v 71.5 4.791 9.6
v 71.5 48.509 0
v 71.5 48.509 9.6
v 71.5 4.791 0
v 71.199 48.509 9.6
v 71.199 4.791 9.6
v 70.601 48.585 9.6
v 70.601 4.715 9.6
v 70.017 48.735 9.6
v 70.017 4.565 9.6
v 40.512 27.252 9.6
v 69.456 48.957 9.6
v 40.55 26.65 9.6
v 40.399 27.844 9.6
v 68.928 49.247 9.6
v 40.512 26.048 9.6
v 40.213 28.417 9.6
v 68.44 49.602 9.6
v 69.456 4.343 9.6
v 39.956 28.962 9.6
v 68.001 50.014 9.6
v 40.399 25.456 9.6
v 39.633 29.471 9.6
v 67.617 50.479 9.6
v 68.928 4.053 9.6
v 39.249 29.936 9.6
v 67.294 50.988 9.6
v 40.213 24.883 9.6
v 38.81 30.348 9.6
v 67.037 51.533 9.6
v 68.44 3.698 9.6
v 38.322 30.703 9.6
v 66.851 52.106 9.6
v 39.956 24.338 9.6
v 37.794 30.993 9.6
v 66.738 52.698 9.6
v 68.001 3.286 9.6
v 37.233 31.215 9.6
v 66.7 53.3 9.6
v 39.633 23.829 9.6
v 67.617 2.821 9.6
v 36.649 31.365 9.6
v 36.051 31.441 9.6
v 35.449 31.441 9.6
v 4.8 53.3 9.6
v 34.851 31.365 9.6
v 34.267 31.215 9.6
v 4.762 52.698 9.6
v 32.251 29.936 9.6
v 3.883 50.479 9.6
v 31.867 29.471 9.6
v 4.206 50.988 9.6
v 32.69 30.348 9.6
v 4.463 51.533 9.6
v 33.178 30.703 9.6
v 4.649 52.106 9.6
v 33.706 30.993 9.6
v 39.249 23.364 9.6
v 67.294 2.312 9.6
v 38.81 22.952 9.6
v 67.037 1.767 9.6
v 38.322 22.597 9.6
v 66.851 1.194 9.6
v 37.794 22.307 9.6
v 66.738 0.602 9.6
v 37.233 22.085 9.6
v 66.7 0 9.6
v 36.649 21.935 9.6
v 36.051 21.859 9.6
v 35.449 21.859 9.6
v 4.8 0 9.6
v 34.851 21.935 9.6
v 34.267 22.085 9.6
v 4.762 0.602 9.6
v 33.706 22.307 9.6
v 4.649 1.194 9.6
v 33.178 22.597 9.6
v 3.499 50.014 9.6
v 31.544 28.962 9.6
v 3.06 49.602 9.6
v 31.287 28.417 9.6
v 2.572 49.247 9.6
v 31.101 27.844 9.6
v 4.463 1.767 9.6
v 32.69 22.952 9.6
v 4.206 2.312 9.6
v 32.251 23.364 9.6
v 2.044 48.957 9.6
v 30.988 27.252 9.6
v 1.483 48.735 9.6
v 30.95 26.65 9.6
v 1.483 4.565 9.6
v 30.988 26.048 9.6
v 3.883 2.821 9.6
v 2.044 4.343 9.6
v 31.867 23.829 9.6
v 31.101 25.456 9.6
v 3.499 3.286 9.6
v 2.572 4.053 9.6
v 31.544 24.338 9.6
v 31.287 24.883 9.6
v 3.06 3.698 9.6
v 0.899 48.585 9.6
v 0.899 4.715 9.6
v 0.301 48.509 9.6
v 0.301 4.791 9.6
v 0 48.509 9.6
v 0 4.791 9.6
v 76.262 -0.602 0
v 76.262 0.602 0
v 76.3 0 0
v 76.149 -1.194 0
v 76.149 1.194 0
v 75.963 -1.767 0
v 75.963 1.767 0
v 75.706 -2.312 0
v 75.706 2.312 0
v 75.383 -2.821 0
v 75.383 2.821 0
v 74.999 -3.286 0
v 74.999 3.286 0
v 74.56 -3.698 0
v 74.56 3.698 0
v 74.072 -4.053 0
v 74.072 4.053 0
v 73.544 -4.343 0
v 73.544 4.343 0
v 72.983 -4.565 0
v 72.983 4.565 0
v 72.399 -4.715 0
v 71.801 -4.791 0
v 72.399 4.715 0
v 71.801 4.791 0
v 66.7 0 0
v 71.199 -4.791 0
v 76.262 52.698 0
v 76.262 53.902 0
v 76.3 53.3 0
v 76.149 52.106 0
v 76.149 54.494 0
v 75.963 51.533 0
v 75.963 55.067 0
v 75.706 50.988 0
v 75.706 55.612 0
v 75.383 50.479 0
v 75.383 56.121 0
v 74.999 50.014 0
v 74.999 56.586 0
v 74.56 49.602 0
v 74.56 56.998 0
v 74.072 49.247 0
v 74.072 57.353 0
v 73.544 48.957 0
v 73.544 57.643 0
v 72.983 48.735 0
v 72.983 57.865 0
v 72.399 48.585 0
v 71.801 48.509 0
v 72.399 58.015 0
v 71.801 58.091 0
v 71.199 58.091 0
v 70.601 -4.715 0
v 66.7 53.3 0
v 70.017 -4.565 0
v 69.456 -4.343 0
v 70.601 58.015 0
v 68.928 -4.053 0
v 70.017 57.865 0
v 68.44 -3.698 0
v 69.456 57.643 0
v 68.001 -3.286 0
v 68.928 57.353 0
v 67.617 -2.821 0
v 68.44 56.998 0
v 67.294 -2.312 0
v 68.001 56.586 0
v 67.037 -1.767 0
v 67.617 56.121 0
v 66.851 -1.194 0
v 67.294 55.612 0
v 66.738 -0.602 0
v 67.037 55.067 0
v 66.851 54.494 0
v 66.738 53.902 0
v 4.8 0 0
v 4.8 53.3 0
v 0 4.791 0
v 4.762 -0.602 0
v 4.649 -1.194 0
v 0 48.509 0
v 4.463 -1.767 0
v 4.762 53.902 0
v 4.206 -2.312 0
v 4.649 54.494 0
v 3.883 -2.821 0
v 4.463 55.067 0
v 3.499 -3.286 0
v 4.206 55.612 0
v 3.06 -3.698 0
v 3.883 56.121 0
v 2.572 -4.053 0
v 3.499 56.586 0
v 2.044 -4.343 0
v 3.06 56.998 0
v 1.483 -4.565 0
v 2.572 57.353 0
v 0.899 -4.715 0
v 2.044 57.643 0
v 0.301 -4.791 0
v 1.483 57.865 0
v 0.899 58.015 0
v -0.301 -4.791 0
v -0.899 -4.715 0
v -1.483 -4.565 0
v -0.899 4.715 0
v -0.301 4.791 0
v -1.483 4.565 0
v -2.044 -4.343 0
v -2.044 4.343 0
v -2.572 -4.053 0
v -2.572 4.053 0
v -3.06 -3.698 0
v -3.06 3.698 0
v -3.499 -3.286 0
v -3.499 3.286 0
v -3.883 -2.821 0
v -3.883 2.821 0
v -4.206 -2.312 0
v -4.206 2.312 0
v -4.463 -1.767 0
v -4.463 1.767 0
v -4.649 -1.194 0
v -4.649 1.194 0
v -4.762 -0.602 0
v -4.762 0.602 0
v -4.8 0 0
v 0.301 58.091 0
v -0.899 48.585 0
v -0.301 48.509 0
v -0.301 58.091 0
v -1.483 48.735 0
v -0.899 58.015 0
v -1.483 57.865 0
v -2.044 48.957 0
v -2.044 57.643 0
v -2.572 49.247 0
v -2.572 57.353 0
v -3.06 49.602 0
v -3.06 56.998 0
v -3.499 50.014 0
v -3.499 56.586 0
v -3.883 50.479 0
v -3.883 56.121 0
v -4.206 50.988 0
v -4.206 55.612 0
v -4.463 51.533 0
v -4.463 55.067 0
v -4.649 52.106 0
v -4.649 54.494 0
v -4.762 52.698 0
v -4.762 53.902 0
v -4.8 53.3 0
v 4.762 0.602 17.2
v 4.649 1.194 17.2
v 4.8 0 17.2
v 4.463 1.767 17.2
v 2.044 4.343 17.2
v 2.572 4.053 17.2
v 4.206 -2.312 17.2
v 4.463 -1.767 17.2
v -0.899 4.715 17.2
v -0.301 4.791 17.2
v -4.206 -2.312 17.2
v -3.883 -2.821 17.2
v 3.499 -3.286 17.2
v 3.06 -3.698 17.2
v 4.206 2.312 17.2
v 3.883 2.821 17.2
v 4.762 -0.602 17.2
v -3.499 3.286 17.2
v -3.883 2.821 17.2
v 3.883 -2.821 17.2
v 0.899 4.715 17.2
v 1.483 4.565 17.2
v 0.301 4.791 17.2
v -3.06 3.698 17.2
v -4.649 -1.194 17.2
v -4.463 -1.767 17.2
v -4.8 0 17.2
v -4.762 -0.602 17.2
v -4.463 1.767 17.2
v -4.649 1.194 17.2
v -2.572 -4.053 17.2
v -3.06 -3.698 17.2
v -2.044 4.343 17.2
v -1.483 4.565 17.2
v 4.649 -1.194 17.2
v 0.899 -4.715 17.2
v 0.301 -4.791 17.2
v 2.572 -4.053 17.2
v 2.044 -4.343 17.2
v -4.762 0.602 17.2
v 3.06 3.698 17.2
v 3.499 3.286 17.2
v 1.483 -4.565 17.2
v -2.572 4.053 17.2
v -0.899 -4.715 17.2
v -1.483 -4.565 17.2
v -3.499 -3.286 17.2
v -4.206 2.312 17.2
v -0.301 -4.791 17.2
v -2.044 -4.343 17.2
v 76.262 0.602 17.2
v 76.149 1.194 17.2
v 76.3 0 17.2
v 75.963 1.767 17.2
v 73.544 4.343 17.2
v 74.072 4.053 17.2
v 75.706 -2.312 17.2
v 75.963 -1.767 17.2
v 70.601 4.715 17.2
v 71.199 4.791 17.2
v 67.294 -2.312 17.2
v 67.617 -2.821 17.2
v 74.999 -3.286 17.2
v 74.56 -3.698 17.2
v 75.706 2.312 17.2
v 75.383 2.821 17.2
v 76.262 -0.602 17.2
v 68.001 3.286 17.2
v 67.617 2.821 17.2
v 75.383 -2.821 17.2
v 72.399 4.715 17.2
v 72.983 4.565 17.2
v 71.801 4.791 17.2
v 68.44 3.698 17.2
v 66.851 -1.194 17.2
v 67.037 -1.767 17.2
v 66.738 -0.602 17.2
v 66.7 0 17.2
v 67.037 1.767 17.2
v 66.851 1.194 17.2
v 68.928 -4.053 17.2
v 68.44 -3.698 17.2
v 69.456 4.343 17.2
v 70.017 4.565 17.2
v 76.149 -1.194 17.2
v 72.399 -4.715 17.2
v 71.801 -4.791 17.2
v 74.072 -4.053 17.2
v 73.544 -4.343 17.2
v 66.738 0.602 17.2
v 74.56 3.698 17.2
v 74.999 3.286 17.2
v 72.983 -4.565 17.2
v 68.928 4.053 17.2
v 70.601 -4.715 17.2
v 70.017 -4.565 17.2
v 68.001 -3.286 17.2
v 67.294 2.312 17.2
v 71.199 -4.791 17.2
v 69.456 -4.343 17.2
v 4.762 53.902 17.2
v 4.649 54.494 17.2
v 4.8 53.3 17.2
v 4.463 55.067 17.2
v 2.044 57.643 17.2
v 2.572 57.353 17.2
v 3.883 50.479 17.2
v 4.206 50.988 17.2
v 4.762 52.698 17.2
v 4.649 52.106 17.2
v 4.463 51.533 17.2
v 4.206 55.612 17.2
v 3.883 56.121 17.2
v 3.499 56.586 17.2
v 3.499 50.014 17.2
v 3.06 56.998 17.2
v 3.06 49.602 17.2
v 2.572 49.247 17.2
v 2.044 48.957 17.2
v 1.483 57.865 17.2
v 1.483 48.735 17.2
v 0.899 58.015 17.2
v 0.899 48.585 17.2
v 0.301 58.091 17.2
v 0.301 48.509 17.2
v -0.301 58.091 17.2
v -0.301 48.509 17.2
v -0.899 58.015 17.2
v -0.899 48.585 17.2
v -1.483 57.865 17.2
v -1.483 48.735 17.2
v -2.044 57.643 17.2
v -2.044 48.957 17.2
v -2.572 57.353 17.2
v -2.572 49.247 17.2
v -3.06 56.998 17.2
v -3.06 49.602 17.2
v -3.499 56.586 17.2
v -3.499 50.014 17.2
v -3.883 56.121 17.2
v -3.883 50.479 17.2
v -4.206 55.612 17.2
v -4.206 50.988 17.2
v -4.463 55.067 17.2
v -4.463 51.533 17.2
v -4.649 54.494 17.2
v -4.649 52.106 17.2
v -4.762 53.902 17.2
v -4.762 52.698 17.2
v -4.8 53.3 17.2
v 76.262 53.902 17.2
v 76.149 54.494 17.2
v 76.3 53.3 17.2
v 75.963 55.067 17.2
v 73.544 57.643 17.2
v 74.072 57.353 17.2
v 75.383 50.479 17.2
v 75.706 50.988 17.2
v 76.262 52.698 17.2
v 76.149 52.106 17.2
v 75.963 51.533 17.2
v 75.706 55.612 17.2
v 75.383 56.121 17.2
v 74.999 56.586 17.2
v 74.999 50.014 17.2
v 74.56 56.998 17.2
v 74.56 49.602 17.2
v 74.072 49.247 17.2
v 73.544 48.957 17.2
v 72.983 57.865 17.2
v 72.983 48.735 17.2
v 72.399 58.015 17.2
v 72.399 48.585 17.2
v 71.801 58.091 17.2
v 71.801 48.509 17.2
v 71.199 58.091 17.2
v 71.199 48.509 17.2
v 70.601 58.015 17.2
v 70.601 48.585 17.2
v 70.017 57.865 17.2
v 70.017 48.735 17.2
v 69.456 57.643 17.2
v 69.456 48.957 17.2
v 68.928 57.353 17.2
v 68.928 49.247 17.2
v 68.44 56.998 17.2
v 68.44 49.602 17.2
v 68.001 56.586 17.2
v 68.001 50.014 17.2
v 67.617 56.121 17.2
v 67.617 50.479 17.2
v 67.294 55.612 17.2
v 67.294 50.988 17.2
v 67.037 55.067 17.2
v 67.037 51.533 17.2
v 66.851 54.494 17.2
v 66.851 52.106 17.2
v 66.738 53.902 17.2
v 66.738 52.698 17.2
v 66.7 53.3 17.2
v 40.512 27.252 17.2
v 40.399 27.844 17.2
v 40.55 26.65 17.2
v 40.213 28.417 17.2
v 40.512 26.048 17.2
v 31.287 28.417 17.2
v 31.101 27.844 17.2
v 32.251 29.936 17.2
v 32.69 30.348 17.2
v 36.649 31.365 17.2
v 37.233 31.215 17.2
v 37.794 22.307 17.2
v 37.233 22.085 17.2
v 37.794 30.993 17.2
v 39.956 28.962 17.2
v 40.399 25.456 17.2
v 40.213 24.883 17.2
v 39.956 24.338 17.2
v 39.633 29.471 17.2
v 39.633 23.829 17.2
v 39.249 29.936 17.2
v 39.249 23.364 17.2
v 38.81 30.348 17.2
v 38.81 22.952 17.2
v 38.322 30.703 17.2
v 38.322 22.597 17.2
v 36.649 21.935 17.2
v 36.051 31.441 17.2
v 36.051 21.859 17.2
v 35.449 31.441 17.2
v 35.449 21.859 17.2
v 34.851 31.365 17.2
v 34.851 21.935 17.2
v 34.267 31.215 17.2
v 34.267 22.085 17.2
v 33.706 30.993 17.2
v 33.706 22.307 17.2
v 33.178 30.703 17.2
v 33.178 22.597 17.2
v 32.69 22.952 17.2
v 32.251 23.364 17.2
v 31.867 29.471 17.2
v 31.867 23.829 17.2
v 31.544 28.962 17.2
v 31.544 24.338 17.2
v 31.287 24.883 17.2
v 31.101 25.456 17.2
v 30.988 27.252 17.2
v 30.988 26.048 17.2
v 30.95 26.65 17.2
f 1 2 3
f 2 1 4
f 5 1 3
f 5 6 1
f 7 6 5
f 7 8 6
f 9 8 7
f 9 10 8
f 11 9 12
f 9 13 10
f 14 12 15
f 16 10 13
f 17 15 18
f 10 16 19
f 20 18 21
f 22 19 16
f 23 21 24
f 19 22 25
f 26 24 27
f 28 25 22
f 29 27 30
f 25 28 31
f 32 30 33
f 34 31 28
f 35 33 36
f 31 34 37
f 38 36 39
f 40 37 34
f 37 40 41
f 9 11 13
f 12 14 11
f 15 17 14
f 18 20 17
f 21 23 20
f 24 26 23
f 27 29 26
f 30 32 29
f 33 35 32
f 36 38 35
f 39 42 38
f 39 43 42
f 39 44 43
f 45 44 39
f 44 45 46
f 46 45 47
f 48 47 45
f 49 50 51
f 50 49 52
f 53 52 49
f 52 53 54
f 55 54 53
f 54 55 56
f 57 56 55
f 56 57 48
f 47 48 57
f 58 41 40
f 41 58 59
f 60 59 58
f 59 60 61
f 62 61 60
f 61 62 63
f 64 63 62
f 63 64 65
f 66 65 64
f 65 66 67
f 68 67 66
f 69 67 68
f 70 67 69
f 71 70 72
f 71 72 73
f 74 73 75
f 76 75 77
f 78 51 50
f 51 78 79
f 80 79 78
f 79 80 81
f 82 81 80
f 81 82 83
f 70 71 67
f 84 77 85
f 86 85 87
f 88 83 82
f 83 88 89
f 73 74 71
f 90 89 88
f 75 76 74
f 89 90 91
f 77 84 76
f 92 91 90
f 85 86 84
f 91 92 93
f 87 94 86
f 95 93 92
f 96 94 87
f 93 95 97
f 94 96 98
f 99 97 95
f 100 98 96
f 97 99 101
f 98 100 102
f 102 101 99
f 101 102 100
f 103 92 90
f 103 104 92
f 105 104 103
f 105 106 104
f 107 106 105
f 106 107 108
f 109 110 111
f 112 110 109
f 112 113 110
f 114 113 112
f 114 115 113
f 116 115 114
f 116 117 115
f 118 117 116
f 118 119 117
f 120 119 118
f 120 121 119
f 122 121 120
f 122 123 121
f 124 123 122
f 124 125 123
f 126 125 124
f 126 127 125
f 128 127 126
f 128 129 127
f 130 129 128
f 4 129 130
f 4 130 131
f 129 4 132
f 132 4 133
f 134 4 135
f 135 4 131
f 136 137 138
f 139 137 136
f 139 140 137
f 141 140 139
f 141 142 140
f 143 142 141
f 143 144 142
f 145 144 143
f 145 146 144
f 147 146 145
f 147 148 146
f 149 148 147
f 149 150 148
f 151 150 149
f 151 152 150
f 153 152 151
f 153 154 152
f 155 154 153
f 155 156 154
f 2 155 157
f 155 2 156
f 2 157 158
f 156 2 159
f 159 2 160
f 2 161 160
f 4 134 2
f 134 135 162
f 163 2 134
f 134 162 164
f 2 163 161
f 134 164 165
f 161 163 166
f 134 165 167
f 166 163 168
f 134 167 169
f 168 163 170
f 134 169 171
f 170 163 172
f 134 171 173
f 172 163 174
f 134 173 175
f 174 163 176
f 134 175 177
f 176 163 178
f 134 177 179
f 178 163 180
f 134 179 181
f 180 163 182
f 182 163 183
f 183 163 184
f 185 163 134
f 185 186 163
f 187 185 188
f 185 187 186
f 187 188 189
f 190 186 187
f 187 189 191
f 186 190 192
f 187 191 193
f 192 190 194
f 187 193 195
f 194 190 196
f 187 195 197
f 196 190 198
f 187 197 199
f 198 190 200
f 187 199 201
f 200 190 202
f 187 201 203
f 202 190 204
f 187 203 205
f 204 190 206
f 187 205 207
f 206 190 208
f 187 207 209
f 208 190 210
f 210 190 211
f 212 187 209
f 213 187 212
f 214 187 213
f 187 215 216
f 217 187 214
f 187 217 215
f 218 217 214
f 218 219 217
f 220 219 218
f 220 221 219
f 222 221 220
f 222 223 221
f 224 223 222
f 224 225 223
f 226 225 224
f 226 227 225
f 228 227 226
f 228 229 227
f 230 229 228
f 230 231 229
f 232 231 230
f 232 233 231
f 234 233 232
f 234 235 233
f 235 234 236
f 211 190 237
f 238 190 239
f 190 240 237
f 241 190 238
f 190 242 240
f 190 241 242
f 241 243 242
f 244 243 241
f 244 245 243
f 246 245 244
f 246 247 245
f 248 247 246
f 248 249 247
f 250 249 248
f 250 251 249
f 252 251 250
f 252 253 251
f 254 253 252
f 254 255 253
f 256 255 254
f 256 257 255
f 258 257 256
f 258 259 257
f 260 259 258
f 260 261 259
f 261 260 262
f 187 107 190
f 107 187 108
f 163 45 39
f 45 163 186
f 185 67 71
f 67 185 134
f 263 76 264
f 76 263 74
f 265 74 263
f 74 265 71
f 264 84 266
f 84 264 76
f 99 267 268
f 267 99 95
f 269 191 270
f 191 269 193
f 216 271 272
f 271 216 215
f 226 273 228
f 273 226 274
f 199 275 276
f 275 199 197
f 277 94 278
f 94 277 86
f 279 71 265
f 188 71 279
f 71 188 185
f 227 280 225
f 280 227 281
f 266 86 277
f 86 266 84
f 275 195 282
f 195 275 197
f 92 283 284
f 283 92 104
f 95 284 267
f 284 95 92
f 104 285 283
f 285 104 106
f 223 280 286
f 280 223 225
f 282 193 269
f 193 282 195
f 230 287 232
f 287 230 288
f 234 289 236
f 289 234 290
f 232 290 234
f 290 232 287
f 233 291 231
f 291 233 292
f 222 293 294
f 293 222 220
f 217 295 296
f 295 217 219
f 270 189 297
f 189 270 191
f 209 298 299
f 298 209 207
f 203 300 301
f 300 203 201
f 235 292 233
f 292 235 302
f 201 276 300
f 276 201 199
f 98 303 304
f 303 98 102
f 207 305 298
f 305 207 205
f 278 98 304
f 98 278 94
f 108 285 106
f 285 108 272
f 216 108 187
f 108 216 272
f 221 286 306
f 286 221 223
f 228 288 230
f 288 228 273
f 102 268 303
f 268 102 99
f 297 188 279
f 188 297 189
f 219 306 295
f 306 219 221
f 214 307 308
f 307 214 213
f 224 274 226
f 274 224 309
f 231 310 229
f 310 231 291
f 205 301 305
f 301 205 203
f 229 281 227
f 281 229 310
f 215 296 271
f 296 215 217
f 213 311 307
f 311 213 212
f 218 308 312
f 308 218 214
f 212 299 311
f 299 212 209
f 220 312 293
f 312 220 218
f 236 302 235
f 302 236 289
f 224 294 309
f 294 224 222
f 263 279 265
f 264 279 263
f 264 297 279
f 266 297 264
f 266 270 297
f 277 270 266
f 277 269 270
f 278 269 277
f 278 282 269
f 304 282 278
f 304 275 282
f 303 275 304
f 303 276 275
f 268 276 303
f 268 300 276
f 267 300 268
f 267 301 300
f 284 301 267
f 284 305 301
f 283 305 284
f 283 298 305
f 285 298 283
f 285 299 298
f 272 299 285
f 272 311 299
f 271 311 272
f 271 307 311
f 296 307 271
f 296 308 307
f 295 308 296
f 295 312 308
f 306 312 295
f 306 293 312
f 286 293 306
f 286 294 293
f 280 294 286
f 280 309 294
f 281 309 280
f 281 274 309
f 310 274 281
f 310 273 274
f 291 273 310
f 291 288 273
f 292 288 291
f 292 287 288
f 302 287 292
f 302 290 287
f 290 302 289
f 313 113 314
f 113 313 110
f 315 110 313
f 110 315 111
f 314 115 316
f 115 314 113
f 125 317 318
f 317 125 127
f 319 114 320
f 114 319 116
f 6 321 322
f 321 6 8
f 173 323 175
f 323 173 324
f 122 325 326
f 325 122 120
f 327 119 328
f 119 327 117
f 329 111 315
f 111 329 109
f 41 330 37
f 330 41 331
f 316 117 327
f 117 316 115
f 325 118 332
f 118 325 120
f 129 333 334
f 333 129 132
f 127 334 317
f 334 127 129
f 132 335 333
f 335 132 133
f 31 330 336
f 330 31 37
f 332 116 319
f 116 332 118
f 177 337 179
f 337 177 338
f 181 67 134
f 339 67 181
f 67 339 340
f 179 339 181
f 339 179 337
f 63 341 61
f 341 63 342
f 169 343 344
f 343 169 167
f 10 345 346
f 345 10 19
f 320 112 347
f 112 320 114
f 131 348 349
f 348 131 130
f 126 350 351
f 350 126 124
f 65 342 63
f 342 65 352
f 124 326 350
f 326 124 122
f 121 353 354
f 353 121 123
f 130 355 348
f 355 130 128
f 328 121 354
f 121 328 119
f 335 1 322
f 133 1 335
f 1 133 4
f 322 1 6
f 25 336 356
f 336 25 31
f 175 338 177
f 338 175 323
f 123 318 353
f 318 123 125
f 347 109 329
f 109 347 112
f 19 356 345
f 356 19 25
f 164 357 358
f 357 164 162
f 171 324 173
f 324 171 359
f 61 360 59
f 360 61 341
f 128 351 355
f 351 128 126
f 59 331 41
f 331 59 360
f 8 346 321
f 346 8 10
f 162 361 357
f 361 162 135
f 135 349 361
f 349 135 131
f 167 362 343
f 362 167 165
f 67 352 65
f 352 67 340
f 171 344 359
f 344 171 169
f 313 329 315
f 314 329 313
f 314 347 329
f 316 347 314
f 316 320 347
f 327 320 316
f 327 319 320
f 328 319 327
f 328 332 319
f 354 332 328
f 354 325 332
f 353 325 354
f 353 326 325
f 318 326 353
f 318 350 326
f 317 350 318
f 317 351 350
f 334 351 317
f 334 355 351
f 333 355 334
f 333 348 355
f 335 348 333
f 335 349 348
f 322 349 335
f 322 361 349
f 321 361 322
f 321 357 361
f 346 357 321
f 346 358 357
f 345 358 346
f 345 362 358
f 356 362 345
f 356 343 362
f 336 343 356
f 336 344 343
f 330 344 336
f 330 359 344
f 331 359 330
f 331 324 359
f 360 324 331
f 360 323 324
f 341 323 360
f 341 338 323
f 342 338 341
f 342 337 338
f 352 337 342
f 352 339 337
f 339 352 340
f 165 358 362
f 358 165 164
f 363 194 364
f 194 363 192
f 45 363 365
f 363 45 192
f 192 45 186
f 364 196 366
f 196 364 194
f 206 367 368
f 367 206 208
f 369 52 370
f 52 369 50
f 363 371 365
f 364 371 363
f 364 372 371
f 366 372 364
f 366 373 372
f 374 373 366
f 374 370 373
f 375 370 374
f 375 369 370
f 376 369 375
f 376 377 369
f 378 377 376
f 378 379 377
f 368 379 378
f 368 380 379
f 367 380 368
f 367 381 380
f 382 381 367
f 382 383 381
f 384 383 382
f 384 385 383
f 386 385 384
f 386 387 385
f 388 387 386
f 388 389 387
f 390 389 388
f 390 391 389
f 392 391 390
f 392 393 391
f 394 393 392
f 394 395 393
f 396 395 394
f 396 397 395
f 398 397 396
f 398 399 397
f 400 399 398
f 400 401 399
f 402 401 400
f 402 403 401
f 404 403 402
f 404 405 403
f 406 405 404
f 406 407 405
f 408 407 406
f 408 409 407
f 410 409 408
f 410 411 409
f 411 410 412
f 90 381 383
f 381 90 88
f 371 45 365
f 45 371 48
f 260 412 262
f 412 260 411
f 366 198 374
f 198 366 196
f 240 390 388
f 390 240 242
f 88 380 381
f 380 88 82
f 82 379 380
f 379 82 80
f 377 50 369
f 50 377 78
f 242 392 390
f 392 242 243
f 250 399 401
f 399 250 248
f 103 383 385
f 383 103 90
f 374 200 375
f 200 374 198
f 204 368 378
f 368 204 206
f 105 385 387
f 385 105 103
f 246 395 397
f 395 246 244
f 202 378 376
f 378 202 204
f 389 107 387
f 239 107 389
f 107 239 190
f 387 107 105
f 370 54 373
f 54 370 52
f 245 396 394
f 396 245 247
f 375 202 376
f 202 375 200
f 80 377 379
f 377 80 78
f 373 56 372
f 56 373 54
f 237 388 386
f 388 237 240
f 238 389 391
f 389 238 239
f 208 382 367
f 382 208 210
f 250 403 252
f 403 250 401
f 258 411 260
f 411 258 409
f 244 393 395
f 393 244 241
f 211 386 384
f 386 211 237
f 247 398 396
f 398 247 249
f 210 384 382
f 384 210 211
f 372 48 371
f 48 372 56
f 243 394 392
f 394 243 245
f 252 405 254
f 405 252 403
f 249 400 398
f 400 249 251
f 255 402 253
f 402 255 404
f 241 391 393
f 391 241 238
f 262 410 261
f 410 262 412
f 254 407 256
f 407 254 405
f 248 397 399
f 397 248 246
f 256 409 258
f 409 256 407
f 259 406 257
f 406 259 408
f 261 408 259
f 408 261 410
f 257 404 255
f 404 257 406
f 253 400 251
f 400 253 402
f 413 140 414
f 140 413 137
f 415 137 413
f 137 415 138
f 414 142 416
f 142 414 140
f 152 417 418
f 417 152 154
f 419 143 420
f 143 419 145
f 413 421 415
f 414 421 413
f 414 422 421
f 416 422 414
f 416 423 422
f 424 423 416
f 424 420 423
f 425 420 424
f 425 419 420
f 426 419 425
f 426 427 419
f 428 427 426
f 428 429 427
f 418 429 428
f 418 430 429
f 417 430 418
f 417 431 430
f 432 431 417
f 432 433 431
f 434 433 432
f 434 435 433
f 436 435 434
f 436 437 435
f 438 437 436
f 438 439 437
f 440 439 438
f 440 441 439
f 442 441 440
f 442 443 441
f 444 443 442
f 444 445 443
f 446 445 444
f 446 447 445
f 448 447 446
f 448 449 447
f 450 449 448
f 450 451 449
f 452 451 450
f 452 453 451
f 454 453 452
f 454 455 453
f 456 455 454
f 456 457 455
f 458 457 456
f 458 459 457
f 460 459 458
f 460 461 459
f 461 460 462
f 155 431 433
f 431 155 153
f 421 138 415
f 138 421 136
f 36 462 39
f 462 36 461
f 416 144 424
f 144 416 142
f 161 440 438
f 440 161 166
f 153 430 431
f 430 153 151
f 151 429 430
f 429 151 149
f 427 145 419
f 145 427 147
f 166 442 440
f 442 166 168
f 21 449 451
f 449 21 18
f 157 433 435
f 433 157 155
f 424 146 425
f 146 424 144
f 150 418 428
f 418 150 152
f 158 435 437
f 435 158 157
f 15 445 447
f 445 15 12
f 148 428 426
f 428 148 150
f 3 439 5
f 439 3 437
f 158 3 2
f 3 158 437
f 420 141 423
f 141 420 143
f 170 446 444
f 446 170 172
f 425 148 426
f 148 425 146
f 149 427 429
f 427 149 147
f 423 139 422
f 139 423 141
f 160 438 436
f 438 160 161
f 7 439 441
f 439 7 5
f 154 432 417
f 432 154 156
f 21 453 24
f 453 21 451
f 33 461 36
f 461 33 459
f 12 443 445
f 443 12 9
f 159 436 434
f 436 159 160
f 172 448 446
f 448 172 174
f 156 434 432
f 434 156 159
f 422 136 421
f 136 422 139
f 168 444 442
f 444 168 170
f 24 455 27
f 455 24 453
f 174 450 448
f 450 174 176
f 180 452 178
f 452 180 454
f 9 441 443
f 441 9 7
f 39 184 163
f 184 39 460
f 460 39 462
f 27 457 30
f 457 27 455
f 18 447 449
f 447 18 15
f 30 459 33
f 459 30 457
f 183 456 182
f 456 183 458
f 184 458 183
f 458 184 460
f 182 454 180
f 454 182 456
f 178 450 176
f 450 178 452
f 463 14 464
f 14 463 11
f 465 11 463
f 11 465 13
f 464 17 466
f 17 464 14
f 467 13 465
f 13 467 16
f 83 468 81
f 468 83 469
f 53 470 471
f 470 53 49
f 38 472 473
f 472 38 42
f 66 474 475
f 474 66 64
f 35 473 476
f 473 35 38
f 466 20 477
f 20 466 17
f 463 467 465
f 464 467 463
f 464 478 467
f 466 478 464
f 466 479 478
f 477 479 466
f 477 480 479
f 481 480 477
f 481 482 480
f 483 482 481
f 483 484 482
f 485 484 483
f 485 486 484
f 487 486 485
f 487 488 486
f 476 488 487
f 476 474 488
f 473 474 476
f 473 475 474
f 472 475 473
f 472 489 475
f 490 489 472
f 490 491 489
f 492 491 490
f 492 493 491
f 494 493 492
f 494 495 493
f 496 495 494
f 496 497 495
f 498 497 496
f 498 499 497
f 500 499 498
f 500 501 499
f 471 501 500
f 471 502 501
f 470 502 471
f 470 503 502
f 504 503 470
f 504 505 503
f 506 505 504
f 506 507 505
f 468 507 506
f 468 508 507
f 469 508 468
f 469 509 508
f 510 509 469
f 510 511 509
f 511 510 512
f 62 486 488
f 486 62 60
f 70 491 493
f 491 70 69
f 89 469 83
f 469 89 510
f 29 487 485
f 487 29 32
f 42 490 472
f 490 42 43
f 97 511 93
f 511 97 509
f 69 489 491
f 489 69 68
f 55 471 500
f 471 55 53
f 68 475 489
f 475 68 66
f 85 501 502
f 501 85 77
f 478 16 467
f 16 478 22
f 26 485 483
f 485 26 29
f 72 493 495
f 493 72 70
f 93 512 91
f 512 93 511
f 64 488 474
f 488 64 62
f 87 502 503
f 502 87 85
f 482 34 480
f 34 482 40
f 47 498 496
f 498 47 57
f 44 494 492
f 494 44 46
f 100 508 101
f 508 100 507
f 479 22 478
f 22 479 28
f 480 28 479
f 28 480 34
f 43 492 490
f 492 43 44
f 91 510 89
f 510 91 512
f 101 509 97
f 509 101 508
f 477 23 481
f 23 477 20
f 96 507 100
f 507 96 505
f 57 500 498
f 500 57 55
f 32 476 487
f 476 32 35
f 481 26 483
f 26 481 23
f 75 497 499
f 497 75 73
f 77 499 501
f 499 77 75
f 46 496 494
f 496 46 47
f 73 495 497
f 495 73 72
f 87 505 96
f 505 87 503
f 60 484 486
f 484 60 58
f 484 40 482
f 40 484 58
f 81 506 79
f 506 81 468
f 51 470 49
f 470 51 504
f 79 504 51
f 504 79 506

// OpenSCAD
$fn = 50;

s = 1.3;

x = 55*s;
y = 41*s; 
z = 9.6;

ultra = 18*s;

cylHeight = 17.2;
cylRad = 9.6/2;

oddCylShift = ultra*sin(45);

module cyl(){
	cylinder(r=cylRad, h=cylHeight);
}

module mainPart() {
	union(){
		cube([x,y,z]);
		
		cyl();
		
		translate([x,0,0])
		cyl();
		
		translate([0,y,0])
		cyl();

		translate([x,y,0])
		cyl();
		
		translate([x/2,y/2,0])
		cyl();
	}
}

mainPart();
